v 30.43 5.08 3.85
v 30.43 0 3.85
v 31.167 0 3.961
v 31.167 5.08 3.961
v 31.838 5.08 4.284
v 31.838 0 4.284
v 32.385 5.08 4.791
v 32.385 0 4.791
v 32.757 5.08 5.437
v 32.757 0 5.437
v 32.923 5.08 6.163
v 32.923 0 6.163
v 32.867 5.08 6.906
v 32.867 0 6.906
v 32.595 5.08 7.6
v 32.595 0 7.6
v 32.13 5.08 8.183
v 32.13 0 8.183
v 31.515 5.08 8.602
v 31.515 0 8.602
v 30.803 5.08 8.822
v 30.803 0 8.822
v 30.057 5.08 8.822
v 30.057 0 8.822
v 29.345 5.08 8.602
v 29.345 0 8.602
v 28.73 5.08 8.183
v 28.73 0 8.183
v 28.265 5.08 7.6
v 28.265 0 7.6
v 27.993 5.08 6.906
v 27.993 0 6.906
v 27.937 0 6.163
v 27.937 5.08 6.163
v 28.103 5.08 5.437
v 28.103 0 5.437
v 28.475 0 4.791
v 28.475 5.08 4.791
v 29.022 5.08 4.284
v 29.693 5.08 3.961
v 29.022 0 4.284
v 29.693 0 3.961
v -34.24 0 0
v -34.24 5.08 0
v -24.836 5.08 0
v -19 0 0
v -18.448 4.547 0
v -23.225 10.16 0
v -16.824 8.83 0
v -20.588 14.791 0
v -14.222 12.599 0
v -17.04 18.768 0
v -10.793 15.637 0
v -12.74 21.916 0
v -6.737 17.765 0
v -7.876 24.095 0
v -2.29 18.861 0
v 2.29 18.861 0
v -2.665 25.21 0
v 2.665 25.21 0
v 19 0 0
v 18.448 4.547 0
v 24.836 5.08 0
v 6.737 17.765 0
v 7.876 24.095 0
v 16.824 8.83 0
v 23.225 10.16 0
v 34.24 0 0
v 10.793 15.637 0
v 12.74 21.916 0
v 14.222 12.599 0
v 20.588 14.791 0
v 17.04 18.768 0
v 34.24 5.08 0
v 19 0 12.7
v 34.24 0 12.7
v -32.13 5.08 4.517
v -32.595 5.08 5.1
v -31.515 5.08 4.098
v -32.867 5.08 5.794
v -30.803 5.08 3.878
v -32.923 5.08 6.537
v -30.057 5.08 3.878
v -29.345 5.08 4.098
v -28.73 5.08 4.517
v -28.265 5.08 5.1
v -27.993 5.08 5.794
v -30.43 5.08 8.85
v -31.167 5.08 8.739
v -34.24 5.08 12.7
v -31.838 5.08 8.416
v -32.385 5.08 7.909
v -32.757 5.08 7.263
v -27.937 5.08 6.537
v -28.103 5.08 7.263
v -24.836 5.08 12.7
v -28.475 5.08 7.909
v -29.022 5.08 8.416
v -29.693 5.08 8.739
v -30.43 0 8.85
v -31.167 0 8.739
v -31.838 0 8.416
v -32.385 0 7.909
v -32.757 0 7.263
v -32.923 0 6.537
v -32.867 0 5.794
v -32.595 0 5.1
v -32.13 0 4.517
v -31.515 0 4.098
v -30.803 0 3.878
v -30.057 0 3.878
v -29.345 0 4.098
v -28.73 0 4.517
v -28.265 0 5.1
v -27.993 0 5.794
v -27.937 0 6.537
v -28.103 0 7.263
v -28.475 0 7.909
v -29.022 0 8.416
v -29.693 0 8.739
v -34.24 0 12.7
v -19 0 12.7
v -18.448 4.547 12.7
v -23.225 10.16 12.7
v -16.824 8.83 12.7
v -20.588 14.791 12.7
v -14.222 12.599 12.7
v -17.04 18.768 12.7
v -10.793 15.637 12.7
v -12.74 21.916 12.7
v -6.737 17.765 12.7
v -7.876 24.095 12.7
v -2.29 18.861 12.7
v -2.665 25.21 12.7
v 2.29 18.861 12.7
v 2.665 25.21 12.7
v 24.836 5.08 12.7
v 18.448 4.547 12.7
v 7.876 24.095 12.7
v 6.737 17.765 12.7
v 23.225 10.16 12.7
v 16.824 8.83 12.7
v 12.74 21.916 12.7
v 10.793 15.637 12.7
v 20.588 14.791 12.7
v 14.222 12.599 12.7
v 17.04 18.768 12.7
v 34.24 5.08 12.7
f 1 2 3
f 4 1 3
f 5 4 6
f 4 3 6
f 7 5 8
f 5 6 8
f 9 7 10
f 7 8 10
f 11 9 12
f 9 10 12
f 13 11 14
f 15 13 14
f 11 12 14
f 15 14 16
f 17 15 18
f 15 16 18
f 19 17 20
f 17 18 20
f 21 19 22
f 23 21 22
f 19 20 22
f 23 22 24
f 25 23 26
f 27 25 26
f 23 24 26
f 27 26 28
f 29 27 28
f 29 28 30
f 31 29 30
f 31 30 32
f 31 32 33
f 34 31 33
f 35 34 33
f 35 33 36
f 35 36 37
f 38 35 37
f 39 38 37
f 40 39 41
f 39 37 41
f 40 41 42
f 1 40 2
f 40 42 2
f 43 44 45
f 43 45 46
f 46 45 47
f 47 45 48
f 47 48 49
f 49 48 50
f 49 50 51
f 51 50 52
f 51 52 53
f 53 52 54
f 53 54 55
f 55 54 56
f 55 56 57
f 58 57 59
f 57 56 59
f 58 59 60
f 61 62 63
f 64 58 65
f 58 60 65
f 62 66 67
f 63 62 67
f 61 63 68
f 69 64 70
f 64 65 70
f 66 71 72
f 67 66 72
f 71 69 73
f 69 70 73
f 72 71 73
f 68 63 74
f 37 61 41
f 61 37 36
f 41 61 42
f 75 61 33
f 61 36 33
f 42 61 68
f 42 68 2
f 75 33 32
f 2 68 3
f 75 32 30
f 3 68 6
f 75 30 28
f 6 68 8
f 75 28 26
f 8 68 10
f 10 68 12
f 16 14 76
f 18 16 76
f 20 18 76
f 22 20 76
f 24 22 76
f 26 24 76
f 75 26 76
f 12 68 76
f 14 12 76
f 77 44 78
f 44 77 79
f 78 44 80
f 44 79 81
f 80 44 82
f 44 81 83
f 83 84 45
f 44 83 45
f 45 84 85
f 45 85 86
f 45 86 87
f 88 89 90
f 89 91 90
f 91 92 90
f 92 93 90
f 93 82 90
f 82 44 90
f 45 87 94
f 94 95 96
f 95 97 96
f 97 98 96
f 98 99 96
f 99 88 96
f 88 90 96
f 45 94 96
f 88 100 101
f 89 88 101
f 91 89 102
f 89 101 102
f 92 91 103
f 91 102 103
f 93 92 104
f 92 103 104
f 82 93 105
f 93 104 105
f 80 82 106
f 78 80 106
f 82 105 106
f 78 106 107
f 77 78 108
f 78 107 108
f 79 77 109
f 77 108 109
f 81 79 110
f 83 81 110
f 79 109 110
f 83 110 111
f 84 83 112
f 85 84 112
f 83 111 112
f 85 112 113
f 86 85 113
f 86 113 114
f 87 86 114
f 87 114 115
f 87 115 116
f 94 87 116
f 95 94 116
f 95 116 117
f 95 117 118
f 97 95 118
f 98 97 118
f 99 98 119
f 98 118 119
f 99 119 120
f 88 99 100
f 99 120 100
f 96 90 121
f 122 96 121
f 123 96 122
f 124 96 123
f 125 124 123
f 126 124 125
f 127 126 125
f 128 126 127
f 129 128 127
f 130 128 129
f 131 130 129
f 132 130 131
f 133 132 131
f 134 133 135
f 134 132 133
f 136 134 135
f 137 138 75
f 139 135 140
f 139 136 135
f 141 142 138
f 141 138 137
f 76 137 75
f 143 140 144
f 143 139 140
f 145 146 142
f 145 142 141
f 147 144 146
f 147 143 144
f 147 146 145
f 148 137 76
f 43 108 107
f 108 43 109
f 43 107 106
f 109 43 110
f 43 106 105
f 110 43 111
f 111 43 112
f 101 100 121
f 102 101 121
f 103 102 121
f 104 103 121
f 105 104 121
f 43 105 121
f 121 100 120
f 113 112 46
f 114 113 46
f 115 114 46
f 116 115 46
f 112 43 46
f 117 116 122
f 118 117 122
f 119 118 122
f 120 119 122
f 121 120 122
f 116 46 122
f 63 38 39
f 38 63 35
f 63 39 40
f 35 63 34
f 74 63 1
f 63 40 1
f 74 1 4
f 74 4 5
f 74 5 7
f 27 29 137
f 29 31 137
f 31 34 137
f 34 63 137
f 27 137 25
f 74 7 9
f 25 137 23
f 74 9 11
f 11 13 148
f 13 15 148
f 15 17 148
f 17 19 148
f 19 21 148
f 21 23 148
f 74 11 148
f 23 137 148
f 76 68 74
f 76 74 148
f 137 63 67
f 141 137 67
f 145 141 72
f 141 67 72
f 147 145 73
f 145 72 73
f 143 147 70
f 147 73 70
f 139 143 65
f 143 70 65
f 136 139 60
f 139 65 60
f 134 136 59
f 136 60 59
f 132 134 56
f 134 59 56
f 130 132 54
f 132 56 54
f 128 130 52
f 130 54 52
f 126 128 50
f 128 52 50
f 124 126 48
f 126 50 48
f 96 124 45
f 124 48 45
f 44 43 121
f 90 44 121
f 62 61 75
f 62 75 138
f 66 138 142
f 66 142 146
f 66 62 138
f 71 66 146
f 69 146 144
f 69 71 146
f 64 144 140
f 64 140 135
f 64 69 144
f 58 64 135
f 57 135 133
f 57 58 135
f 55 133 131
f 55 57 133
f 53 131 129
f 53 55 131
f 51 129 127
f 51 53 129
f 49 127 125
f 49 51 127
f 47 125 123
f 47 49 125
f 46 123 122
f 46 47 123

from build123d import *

# Parameters (mm, degrees)
SKETCH1_R                = 25.35
SKETCH1_R_2              = 19
BOSS_EXTRUDE1_DEPTH      = 12.7
BODY_DELETE_KEEP_1_DEPTH = 12.7
SKETCH2_W                = 15.24
SKETCH2_H                = 12.7
SKETCH2_R                = 2.5
BOSS_EXTRUDE2_DEPTH      = 5.08


# Read off the part's stored shape, not the designer's step: Body-Delete/Keep 1
with BuildPart() as part:
    # Sketch1 → Boss-Extrude1 (new body)
    with BuildSketch(Plane.XY):
        Circle(SKETCH1_R)
        Circle(SKETCH1_R_2, mode=Mode.SUBTRACT)
    extrude(amount=BOSS_EXTRUDE1_DEPTH)


with BuildPart() as body_2:
    # Split1: the piece on the far side of the plane
    add(part.part)
    split(bisect_by=Plane.ZX, keep=Keep.BOTTOM)

    # Body-Delete/Keep 1 outline → Body-Delete/Keep 1 (cut)
    with BuildSketch(Plane.XY):
        with BuildLine():
            ThreePointArc((-25.35, 0), (0, -25.35), (25.35, 0))
            Line((25.35, 0), (19, 0))
            ThreePointArc((19, 0), (0, -19), (-19, 0))
            Line((-19, 0), (-25.35, 0))
        make_face()
    extrude(amount=BODY_DELETE_KEEP_1_DEPTH, mode=Mode.SUBTRACT)


with BuildPart() as part_1:
    add(part.part)

    # Split1
    split(bisect_by=Plane.ZX, keep=Keep.TOP)

    # Sketch2 → Boss-Extrude2 (add)
    # profile 1 of 2: a face of its own
    with BuildSketch(Plane.XZ):
        with Locations((26.62, 6.35)):
            Rectangle(SKETCH2_W, SKETCH2_H)
        with Locations(Location((30.43, 6.35, 0), (0, 0, 270))):
            Circle(SKETCH2_R, mode=Mode.SUBTRACT)
    # profile 2 of 2: a face of its own
    with BuildSketch(Plane.XZ):
        with Locations((-26.62, 6.35)):
            Rectangle(SKETCH2_W, SKETCH2_H)
        with Locations(Location((-30.43, 6.35, 0), (0, 0, 90))):
            Circle(SKETCH2_R, mode=Mode.SUBTRACT)
    extrude(amount=-BOSS_EXTRUDE2_DEPTH)


solid = part_1.part
